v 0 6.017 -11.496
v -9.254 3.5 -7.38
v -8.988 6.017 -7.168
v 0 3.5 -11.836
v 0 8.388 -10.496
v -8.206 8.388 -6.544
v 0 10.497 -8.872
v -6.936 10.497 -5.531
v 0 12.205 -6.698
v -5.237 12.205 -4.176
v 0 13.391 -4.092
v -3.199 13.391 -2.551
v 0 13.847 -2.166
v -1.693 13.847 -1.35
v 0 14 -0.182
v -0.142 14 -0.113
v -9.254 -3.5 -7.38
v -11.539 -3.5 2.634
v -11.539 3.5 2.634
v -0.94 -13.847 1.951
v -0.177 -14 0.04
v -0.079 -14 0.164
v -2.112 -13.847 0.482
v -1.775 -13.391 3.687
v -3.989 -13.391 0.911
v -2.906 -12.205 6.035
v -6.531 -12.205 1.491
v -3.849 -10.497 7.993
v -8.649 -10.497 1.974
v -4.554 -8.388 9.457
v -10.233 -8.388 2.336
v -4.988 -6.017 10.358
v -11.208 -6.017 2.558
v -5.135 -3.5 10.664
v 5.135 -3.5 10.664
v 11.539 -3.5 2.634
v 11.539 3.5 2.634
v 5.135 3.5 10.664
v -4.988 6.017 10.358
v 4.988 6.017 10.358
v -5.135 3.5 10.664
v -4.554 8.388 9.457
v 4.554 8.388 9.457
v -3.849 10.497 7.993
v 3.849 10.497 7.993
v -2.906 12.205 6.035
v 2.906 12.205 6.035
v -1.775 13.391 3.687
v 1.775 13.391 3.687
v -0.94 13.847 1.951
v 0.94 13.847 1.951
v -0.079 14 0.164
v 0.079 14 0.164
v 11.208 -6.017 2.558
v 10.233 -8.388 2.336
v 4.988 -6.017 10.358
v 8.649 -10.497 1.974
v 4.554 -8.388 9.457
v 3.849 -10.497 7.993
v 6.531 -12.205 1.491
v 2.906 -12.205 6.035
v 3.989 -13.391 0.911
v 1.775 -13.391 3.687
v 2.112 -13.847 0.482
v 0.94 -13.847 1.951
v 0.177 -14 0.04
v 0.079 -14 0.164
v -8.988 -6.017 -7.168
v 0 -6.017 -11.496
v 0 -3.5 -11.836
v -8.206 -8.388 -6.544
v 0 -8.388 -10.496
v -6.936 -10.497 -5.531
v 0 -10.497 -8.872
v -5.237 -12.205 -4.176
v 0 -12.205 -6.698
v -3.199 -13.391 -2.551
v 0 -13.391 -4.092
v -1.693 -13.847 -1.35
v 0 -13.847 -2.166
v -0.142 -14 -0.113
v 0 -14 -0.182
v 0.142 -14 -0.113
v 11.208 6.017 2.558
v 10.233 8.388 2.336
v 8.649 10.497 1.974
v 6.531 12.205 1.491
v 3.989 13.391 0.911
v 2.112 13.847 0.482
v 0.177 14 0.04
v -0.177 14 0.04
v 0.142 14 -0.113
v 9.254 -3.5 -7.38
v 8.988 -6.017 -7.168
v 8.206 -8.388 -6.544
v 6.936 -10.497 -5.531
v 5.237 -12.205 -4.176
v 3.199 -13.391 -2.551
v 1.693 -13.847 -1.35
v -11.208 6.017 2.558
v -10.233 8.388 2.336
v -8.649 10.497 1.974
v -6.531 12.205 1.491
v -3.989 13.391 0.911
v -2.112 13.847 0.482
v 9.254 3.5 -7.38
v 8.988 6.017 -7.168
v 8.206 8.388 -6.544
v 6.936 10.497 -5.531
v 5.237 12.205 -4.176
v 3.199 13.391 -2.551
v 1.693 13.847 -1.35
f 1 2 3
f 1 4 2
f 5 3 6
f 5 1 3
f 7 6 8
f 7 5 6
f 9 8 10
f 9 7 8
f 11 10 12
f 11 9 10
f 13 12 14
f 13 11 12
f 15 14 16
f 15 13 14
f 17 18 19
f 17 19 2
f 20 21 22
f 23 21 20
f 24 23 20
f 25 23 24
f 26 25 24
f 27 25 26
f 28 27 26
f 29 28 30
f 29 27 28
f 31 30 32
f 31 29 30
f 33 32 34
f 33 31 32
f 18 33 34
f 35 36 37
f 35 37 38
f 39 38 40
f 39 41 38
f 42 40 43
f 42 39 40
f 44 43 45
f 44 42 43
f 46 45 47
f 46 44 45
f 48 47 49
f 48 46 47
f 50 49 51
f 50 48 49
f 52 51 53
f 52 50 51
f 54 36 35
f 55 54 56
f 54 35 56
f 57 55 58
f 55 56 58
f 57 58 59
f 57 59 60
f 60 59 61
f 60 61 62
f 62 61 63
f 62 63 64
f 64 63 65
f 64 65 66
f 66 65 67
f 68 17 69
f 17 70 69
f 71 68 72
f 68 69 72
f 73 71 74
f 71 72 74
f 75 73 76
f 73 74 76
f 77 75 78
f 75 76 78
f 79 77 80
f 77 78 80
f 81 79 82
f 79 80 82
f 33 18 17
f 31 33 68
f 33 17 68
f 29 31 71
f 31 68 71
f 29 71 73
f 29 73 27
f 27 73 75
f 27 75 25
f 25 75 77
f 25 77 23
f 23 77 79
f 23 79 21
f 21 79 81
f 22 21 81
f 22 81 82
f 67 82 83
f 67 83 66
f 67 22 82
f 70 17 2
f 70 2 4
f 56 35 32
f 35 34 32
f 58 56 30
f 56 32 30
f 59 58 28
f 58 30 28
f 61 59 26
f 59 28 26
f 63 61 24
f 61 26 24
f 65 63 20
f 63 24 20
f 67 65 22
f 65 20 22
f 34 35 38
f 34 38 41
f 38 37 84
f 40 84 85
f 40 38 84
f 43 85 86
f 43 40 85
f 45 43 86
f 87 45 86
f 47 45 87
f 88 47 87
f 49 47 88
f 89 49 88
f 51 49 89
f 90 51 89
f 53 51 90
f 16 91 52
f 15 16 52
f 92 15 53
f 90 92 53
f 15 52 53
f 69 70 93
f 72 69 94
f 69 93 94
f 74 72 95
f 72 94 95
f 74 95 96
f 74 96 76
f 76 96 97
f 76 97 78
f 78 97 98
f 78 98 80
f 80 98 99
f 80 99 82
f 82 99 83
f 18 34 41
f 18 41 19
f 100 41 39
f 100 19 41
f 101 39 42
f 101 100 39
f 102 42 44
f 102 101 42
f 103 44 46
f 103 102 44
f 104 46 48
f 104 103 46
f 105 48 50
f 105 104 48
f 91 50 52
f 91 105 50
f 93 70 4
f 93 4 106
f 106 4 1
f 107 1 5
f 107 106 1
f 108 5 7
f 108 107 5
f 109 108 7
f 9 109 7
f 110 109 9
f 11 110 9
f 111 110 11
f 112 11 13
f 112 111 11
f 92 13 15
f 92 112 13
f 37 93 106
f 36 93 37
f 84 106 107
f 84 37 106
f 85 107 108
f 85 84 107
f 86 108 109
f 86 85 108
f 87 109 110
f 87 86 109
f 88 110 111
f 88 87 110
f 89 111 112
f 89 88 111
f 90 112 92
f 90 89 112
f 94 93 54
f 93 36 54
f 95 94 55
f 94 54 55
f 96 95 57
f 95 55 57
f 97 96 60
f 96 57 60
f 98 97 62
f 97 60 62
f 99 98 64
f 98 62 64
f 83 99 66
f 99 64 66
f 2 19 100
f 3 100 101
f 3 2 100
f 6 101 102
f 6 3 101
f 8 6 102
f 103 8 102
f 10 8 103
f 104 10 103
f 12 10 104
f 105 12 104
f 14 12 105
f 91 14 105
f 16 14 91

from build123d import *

# Parameters (mm, degrees)
F1_DEPTH      = 14
F1_DEPTH_BACK = 14
F2_R          = 10.5


with BuildPart() as f1:
    # F0 (on Front) → F1 (new body, two sides)
    with BuildSketch(Plane.XZ) as f1_sk:
        Polygon((5.135478, 10.66393), (-5.135478, 10.66393), (-11.539315, 2.633773), (-9.253812, -7.379669), (0, -11.83607), (9.253812, -7.379669), (11.539315, 2.633773), align=None)
    extrude(amount=F1_DEPTH)
    extrude(f1_sk.sketch, amount=-F1_DEPTH_BACK)

    # F2
    f2_edges = [f1.edges().sort_by_distance(p)[0] for p in [
        (-10.396563, -14, -2.372948),
        (-4.626906, -14, -9.607869),
        (4.626906, -14, -9.607869),
        (10.396563, -14, -2.372948),
        (8.337396, -14, 6.648852),
        (0, -14, 10.66393),
        (-8.337396, -14, 6.648852),
        (-10.396563, 14, -2.372948),
        (-4.626906, 14, -9.607869),
        (4.626906, 14, -9.607869),
        (10.396563, 14, -2.372948),
        (8.337396, 14, 6.648852),
        (0, 14, 10.66393),
        (-8.337396, 14, 6.648852),
    ]]
    fillet(f2_edges, radius=F2_R)


solid = f1.part
